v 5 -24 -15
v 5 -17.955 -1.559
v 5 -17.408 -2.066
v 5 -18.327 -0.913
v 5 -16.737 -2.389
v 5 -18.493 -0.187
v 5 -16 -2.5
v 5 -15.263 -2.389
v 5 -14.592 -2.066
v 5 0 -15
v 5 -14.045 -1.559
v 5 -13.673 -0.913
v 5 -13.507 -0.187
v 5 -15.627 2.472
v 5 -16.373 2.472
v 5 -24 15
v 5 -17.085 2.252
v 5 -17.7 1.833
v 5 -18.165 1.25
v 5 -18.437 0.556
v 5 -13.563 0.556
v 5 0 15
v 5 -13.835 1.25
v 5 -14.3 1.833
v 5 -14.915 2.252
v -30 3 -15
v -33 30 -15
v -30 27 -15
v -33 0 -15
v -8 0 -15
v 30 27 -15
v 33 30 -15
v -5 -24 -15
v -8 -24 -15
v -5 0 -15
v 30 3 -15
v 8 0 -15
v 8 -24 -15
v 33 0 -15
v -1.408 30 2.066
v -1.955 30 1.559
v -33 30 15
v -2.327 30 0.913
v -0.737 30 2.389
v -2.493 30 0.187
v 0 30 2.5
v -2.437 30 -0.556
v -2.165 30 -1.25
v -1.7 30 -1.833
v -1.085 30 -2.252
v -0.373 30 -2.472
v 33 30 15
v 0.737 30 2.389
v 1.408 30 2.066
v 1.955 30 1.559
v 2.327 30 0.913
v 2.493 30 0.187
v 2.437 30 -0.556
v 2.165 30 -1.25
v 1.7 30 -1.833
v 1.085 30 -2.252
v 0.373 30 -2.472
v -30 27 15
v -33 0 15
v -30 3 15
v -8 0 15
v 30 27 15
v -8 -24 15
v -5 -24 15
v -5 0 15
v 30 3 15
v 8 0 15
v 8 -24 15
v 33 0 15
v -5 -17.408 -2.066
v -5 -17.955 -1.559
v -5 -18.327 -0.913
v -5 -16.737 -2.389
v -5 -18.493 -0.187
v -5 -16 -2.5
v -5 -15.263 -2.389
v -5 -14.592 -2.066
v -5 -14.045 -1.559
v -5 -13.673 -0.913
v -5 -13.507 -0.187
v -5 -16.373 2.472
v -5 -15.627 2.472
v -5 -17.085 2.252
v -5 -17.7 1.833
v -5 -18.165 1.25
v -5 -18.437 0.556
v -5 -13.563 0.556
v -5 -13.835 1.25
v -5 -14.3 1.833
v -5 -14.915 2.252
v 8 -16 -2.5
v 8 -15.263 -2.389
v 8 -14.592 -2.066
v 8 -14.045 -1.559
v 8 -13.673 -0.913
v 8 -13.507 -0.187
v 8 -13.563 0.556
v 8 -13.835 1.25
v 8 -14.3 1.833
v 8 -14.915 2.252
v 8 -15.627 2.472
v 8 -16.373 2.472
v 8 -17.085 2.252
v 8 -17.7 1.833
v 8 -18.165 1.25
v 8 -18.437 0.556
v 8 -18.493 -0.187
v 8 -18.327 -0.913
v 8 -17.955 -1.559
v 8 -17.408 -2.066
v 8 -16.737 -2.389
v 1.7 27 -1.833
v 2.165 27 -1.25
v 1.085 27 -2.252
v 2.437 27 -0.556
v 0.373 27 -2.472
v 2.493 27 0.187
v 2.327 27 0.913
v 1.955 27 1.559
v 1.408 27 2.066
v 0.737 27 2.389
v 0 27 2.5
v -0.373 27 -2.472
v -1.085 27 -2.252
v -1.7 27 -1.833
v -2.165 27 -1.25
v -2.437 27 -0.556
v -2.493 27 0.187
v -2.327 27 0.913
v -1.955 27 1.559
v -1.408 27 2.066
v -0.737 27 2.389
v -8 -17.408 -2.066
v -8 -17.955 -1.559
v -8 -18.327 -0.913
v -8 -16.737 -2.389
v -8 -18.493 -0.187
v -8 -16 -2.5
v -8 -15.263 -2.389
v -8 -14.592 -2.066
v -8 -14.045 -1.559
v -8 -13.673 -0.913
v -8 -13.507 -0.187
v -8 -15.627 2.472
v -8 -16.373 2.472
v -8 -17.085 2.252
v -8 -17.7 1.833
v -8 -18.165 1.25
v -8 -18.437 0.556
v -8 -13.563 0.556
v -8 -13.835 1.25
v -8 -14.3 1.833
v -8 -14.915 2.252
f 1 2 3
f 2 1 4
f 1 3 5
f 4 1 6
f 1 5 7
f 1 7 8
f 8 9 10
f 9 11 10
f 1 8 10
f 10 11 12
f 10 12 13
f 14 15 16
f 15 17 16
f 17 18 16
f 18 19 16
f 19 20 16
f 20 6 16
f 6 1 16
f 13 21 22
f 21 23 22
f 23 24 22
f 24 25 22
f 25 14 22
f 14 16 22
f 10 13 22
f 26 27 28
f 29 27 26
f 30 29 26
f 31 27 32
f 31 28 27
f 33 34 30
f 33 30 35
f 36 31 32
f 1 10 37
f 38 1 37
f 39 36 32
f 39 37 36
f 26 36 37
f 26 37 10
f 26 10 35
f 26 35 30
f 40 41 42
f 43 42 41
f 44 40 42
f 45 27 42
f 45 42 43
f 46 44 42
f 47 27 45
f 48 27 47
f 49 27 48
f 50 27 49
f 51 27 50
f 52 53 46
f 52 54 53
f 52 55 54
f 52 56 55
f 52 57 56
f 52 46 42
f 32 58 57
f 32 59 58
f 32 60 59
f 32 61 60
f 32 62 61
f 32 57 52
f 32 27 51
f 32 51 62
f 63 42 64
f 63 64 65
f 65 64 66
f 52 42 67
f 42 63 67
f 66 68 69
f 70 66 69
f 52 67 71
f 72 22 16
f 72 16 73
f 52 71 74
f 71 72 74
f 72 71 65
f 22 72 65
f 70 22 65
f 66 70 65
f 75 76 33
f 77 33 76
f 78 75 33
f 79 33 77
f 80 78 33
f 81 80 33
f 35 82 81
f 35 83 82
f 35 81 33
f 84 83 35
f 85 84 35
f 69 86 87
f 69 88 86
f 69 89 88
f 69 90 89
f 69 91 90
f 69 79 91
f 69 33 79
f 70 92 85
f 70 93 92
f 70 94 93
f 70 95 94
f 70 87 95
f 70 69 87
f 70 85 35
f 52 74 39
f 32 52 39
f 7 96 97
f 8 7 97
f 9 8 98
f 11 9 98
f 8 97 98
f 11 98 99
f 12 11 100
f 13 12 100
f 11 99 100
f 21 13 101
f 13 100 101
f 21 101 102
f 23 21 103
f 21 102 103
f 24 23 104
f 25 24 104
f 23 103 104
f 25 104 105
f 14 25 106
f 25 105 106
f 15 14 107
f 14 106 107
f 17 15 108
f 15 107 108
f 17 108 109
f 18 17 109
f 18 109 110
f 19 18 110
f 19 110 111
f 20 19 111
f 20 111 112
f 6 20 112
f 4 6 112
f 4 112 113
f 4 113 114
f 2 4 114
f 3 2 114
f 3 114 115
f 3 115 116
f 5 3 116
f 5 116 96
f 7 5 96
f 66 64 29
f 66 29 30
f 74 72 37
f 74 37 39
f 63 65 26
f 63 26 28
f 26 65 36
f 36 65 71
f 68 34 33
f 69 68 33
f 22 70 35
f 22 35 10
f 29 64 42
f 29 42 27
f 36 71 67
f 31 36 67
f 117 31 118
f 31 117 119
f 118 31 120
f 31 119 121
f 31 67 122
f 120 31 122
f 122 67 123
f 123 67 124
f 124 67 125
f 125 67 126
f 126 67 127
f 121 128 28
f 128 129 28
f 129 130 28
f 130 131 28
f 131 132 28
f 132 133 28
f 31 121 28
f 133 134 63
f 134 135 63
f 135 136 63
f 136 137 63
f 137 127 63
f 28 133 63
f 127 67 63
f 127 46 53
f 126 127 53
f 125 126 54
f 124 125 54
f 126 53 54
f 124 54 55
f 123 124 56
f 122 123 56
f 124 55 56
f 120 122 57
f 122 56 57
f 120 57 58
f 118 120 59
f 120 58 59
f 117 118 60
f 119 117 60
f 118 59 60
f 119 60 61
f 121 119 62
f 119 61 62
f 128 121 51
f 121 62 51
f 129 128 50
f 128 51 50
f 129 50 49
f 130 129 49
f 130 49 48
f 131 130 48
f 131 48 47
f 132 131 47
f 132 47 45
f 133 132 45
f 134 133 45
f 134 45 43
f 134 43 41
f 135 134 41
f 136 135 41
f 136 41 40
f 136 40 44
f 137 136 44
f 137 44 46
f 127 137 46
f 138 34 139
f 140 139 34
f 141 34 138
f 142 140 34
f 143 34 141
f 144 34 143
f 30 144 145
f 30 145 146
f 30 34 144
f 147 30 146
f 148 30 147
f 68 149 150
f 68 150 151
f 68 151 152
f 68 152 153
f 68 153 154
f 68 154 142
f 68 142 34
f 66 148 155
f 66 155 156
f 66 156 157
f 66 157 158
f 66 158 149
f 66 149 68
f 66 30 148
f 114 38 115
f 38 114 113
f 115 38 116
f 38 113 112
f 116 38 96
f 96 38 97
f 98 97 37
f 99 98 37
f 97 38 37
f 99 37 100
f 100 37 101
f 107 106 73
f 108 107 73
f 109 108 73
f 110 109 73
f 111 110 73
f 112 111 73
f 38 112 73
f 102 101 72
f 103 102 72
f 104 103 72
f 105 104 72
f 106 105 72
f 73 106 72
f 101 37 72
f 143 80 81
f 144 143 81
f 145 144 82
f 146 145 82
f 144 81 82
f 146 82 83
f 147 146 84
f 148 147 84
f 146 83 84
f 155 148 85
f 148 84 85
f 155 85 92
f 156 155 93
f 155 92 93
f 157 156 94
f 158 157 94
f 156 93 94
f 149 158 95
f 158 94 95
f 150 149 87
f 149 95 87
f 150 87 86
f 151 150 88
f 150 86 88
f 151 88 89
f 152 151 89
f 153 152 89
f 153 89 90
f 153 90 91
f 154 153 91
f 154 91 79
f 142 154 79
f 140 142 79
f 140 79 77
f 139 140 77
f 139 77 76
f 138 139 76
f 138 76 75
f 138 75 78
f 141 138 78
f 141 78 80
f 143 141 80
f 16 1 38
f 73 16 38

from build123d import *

# Parameters (mm, degrees)
SKETCH1_W           = 66
SKETCH1_H           = 30
BOSS_EXTRUDE1_DEPTH = 30
SKETCH2_W           = 30
SKETCH2_H           = 24
CUT_EXTRUDE1_DEPTH  = 54.749418602
SKETCH3_R           = 2.5
CUT_EXTRUDE2_DEPTH  = 10
SKETCH4_W           = 16
SKETCH4_H           = 30
BOSS_EXTRUDE2_DEPTH = 24
SKETCH5_W           = 10
SKETCH5_H           = 24
CUT_EXTRUDE3_DEPTH  = 54.749418602
SKETCH6_R           = 2.5
CUT_EXTRUDE4_DEPTH  = 24


with BuildPart() as part:
    # Sketch1 → Boss-Extrude1 (new body)
    with BuildSketch(Plane(origin=(0, 0, 0), x_dir=(1, 0, 0), z_dir=(0, 1, 0))):
        Rectangle(SKETCH1_W, SKETCH1_H)
    extrude(amount=BOSS_EXTRUDE1_DEPTH)

    # Sketch2 → Cut-Extrude1 (cut, through all)
    with BuildSketch(Plane.XY.offset(15)):
        with Locations((15, 15)):
            Rectangle(SKETCH2_W, SKETCH2_H)
        with Locations((-15, 15)):
            Rectangle(SKETCH2_W, SKETCH2_H)
    extrude(amount=-CUT_EXTRUDE1_DEPTH, mode=Mode.SUBTRACT)

    # Sketch3 → Cut-Extrude2 (cut)
    with BuildSketch(Plane(origin=(0, 30, 0), x_dir=(1, 0, 0), z_dir=(0, 1, 0))):
        with Locations(Location((0, 0, 0), (0, 0, 270))):
            Circle(SKETCH3_R)
    extrude(amount=-CUT_EXTRUDE2_DEPTH, mode=Mode.SUBTRACT)

    # Sketch4 → Boss-Extrude2 (add)
    with BuildSketch(Plane.XZ):
        Rectangle(SKETCH4_W, SKETCH4_H)
    extrude(amount=BOSS_EXTRUDE2_DEPTH)

    # Sketch5 → Cut-Extrude3 (cut, through all)
    with BuildSketch(Plane.XY.offset(15)):
        with Locations((0, -12)):
            Rectangle(SKETCH5_W, SKETCH5_H)
    extrude(amount=-CUT_EXTRUDE3_DEPTH, mode=Mode.SUBTRACT)

    # Sketch6 → Cut-Extrude4 (cut)
    with BuildSketch(Plane(origin=(8, 0, 0), x_dir=(0, 0, -1), z_dir=(1, 0, 0))):
        with Locations((0, -16)):
            Circle(SKETCH6_R)
    extrude(amount=-CUT_EXTRUDE4_DEPTH, mode=Mode.SUBTRACT)


solid = part.part
